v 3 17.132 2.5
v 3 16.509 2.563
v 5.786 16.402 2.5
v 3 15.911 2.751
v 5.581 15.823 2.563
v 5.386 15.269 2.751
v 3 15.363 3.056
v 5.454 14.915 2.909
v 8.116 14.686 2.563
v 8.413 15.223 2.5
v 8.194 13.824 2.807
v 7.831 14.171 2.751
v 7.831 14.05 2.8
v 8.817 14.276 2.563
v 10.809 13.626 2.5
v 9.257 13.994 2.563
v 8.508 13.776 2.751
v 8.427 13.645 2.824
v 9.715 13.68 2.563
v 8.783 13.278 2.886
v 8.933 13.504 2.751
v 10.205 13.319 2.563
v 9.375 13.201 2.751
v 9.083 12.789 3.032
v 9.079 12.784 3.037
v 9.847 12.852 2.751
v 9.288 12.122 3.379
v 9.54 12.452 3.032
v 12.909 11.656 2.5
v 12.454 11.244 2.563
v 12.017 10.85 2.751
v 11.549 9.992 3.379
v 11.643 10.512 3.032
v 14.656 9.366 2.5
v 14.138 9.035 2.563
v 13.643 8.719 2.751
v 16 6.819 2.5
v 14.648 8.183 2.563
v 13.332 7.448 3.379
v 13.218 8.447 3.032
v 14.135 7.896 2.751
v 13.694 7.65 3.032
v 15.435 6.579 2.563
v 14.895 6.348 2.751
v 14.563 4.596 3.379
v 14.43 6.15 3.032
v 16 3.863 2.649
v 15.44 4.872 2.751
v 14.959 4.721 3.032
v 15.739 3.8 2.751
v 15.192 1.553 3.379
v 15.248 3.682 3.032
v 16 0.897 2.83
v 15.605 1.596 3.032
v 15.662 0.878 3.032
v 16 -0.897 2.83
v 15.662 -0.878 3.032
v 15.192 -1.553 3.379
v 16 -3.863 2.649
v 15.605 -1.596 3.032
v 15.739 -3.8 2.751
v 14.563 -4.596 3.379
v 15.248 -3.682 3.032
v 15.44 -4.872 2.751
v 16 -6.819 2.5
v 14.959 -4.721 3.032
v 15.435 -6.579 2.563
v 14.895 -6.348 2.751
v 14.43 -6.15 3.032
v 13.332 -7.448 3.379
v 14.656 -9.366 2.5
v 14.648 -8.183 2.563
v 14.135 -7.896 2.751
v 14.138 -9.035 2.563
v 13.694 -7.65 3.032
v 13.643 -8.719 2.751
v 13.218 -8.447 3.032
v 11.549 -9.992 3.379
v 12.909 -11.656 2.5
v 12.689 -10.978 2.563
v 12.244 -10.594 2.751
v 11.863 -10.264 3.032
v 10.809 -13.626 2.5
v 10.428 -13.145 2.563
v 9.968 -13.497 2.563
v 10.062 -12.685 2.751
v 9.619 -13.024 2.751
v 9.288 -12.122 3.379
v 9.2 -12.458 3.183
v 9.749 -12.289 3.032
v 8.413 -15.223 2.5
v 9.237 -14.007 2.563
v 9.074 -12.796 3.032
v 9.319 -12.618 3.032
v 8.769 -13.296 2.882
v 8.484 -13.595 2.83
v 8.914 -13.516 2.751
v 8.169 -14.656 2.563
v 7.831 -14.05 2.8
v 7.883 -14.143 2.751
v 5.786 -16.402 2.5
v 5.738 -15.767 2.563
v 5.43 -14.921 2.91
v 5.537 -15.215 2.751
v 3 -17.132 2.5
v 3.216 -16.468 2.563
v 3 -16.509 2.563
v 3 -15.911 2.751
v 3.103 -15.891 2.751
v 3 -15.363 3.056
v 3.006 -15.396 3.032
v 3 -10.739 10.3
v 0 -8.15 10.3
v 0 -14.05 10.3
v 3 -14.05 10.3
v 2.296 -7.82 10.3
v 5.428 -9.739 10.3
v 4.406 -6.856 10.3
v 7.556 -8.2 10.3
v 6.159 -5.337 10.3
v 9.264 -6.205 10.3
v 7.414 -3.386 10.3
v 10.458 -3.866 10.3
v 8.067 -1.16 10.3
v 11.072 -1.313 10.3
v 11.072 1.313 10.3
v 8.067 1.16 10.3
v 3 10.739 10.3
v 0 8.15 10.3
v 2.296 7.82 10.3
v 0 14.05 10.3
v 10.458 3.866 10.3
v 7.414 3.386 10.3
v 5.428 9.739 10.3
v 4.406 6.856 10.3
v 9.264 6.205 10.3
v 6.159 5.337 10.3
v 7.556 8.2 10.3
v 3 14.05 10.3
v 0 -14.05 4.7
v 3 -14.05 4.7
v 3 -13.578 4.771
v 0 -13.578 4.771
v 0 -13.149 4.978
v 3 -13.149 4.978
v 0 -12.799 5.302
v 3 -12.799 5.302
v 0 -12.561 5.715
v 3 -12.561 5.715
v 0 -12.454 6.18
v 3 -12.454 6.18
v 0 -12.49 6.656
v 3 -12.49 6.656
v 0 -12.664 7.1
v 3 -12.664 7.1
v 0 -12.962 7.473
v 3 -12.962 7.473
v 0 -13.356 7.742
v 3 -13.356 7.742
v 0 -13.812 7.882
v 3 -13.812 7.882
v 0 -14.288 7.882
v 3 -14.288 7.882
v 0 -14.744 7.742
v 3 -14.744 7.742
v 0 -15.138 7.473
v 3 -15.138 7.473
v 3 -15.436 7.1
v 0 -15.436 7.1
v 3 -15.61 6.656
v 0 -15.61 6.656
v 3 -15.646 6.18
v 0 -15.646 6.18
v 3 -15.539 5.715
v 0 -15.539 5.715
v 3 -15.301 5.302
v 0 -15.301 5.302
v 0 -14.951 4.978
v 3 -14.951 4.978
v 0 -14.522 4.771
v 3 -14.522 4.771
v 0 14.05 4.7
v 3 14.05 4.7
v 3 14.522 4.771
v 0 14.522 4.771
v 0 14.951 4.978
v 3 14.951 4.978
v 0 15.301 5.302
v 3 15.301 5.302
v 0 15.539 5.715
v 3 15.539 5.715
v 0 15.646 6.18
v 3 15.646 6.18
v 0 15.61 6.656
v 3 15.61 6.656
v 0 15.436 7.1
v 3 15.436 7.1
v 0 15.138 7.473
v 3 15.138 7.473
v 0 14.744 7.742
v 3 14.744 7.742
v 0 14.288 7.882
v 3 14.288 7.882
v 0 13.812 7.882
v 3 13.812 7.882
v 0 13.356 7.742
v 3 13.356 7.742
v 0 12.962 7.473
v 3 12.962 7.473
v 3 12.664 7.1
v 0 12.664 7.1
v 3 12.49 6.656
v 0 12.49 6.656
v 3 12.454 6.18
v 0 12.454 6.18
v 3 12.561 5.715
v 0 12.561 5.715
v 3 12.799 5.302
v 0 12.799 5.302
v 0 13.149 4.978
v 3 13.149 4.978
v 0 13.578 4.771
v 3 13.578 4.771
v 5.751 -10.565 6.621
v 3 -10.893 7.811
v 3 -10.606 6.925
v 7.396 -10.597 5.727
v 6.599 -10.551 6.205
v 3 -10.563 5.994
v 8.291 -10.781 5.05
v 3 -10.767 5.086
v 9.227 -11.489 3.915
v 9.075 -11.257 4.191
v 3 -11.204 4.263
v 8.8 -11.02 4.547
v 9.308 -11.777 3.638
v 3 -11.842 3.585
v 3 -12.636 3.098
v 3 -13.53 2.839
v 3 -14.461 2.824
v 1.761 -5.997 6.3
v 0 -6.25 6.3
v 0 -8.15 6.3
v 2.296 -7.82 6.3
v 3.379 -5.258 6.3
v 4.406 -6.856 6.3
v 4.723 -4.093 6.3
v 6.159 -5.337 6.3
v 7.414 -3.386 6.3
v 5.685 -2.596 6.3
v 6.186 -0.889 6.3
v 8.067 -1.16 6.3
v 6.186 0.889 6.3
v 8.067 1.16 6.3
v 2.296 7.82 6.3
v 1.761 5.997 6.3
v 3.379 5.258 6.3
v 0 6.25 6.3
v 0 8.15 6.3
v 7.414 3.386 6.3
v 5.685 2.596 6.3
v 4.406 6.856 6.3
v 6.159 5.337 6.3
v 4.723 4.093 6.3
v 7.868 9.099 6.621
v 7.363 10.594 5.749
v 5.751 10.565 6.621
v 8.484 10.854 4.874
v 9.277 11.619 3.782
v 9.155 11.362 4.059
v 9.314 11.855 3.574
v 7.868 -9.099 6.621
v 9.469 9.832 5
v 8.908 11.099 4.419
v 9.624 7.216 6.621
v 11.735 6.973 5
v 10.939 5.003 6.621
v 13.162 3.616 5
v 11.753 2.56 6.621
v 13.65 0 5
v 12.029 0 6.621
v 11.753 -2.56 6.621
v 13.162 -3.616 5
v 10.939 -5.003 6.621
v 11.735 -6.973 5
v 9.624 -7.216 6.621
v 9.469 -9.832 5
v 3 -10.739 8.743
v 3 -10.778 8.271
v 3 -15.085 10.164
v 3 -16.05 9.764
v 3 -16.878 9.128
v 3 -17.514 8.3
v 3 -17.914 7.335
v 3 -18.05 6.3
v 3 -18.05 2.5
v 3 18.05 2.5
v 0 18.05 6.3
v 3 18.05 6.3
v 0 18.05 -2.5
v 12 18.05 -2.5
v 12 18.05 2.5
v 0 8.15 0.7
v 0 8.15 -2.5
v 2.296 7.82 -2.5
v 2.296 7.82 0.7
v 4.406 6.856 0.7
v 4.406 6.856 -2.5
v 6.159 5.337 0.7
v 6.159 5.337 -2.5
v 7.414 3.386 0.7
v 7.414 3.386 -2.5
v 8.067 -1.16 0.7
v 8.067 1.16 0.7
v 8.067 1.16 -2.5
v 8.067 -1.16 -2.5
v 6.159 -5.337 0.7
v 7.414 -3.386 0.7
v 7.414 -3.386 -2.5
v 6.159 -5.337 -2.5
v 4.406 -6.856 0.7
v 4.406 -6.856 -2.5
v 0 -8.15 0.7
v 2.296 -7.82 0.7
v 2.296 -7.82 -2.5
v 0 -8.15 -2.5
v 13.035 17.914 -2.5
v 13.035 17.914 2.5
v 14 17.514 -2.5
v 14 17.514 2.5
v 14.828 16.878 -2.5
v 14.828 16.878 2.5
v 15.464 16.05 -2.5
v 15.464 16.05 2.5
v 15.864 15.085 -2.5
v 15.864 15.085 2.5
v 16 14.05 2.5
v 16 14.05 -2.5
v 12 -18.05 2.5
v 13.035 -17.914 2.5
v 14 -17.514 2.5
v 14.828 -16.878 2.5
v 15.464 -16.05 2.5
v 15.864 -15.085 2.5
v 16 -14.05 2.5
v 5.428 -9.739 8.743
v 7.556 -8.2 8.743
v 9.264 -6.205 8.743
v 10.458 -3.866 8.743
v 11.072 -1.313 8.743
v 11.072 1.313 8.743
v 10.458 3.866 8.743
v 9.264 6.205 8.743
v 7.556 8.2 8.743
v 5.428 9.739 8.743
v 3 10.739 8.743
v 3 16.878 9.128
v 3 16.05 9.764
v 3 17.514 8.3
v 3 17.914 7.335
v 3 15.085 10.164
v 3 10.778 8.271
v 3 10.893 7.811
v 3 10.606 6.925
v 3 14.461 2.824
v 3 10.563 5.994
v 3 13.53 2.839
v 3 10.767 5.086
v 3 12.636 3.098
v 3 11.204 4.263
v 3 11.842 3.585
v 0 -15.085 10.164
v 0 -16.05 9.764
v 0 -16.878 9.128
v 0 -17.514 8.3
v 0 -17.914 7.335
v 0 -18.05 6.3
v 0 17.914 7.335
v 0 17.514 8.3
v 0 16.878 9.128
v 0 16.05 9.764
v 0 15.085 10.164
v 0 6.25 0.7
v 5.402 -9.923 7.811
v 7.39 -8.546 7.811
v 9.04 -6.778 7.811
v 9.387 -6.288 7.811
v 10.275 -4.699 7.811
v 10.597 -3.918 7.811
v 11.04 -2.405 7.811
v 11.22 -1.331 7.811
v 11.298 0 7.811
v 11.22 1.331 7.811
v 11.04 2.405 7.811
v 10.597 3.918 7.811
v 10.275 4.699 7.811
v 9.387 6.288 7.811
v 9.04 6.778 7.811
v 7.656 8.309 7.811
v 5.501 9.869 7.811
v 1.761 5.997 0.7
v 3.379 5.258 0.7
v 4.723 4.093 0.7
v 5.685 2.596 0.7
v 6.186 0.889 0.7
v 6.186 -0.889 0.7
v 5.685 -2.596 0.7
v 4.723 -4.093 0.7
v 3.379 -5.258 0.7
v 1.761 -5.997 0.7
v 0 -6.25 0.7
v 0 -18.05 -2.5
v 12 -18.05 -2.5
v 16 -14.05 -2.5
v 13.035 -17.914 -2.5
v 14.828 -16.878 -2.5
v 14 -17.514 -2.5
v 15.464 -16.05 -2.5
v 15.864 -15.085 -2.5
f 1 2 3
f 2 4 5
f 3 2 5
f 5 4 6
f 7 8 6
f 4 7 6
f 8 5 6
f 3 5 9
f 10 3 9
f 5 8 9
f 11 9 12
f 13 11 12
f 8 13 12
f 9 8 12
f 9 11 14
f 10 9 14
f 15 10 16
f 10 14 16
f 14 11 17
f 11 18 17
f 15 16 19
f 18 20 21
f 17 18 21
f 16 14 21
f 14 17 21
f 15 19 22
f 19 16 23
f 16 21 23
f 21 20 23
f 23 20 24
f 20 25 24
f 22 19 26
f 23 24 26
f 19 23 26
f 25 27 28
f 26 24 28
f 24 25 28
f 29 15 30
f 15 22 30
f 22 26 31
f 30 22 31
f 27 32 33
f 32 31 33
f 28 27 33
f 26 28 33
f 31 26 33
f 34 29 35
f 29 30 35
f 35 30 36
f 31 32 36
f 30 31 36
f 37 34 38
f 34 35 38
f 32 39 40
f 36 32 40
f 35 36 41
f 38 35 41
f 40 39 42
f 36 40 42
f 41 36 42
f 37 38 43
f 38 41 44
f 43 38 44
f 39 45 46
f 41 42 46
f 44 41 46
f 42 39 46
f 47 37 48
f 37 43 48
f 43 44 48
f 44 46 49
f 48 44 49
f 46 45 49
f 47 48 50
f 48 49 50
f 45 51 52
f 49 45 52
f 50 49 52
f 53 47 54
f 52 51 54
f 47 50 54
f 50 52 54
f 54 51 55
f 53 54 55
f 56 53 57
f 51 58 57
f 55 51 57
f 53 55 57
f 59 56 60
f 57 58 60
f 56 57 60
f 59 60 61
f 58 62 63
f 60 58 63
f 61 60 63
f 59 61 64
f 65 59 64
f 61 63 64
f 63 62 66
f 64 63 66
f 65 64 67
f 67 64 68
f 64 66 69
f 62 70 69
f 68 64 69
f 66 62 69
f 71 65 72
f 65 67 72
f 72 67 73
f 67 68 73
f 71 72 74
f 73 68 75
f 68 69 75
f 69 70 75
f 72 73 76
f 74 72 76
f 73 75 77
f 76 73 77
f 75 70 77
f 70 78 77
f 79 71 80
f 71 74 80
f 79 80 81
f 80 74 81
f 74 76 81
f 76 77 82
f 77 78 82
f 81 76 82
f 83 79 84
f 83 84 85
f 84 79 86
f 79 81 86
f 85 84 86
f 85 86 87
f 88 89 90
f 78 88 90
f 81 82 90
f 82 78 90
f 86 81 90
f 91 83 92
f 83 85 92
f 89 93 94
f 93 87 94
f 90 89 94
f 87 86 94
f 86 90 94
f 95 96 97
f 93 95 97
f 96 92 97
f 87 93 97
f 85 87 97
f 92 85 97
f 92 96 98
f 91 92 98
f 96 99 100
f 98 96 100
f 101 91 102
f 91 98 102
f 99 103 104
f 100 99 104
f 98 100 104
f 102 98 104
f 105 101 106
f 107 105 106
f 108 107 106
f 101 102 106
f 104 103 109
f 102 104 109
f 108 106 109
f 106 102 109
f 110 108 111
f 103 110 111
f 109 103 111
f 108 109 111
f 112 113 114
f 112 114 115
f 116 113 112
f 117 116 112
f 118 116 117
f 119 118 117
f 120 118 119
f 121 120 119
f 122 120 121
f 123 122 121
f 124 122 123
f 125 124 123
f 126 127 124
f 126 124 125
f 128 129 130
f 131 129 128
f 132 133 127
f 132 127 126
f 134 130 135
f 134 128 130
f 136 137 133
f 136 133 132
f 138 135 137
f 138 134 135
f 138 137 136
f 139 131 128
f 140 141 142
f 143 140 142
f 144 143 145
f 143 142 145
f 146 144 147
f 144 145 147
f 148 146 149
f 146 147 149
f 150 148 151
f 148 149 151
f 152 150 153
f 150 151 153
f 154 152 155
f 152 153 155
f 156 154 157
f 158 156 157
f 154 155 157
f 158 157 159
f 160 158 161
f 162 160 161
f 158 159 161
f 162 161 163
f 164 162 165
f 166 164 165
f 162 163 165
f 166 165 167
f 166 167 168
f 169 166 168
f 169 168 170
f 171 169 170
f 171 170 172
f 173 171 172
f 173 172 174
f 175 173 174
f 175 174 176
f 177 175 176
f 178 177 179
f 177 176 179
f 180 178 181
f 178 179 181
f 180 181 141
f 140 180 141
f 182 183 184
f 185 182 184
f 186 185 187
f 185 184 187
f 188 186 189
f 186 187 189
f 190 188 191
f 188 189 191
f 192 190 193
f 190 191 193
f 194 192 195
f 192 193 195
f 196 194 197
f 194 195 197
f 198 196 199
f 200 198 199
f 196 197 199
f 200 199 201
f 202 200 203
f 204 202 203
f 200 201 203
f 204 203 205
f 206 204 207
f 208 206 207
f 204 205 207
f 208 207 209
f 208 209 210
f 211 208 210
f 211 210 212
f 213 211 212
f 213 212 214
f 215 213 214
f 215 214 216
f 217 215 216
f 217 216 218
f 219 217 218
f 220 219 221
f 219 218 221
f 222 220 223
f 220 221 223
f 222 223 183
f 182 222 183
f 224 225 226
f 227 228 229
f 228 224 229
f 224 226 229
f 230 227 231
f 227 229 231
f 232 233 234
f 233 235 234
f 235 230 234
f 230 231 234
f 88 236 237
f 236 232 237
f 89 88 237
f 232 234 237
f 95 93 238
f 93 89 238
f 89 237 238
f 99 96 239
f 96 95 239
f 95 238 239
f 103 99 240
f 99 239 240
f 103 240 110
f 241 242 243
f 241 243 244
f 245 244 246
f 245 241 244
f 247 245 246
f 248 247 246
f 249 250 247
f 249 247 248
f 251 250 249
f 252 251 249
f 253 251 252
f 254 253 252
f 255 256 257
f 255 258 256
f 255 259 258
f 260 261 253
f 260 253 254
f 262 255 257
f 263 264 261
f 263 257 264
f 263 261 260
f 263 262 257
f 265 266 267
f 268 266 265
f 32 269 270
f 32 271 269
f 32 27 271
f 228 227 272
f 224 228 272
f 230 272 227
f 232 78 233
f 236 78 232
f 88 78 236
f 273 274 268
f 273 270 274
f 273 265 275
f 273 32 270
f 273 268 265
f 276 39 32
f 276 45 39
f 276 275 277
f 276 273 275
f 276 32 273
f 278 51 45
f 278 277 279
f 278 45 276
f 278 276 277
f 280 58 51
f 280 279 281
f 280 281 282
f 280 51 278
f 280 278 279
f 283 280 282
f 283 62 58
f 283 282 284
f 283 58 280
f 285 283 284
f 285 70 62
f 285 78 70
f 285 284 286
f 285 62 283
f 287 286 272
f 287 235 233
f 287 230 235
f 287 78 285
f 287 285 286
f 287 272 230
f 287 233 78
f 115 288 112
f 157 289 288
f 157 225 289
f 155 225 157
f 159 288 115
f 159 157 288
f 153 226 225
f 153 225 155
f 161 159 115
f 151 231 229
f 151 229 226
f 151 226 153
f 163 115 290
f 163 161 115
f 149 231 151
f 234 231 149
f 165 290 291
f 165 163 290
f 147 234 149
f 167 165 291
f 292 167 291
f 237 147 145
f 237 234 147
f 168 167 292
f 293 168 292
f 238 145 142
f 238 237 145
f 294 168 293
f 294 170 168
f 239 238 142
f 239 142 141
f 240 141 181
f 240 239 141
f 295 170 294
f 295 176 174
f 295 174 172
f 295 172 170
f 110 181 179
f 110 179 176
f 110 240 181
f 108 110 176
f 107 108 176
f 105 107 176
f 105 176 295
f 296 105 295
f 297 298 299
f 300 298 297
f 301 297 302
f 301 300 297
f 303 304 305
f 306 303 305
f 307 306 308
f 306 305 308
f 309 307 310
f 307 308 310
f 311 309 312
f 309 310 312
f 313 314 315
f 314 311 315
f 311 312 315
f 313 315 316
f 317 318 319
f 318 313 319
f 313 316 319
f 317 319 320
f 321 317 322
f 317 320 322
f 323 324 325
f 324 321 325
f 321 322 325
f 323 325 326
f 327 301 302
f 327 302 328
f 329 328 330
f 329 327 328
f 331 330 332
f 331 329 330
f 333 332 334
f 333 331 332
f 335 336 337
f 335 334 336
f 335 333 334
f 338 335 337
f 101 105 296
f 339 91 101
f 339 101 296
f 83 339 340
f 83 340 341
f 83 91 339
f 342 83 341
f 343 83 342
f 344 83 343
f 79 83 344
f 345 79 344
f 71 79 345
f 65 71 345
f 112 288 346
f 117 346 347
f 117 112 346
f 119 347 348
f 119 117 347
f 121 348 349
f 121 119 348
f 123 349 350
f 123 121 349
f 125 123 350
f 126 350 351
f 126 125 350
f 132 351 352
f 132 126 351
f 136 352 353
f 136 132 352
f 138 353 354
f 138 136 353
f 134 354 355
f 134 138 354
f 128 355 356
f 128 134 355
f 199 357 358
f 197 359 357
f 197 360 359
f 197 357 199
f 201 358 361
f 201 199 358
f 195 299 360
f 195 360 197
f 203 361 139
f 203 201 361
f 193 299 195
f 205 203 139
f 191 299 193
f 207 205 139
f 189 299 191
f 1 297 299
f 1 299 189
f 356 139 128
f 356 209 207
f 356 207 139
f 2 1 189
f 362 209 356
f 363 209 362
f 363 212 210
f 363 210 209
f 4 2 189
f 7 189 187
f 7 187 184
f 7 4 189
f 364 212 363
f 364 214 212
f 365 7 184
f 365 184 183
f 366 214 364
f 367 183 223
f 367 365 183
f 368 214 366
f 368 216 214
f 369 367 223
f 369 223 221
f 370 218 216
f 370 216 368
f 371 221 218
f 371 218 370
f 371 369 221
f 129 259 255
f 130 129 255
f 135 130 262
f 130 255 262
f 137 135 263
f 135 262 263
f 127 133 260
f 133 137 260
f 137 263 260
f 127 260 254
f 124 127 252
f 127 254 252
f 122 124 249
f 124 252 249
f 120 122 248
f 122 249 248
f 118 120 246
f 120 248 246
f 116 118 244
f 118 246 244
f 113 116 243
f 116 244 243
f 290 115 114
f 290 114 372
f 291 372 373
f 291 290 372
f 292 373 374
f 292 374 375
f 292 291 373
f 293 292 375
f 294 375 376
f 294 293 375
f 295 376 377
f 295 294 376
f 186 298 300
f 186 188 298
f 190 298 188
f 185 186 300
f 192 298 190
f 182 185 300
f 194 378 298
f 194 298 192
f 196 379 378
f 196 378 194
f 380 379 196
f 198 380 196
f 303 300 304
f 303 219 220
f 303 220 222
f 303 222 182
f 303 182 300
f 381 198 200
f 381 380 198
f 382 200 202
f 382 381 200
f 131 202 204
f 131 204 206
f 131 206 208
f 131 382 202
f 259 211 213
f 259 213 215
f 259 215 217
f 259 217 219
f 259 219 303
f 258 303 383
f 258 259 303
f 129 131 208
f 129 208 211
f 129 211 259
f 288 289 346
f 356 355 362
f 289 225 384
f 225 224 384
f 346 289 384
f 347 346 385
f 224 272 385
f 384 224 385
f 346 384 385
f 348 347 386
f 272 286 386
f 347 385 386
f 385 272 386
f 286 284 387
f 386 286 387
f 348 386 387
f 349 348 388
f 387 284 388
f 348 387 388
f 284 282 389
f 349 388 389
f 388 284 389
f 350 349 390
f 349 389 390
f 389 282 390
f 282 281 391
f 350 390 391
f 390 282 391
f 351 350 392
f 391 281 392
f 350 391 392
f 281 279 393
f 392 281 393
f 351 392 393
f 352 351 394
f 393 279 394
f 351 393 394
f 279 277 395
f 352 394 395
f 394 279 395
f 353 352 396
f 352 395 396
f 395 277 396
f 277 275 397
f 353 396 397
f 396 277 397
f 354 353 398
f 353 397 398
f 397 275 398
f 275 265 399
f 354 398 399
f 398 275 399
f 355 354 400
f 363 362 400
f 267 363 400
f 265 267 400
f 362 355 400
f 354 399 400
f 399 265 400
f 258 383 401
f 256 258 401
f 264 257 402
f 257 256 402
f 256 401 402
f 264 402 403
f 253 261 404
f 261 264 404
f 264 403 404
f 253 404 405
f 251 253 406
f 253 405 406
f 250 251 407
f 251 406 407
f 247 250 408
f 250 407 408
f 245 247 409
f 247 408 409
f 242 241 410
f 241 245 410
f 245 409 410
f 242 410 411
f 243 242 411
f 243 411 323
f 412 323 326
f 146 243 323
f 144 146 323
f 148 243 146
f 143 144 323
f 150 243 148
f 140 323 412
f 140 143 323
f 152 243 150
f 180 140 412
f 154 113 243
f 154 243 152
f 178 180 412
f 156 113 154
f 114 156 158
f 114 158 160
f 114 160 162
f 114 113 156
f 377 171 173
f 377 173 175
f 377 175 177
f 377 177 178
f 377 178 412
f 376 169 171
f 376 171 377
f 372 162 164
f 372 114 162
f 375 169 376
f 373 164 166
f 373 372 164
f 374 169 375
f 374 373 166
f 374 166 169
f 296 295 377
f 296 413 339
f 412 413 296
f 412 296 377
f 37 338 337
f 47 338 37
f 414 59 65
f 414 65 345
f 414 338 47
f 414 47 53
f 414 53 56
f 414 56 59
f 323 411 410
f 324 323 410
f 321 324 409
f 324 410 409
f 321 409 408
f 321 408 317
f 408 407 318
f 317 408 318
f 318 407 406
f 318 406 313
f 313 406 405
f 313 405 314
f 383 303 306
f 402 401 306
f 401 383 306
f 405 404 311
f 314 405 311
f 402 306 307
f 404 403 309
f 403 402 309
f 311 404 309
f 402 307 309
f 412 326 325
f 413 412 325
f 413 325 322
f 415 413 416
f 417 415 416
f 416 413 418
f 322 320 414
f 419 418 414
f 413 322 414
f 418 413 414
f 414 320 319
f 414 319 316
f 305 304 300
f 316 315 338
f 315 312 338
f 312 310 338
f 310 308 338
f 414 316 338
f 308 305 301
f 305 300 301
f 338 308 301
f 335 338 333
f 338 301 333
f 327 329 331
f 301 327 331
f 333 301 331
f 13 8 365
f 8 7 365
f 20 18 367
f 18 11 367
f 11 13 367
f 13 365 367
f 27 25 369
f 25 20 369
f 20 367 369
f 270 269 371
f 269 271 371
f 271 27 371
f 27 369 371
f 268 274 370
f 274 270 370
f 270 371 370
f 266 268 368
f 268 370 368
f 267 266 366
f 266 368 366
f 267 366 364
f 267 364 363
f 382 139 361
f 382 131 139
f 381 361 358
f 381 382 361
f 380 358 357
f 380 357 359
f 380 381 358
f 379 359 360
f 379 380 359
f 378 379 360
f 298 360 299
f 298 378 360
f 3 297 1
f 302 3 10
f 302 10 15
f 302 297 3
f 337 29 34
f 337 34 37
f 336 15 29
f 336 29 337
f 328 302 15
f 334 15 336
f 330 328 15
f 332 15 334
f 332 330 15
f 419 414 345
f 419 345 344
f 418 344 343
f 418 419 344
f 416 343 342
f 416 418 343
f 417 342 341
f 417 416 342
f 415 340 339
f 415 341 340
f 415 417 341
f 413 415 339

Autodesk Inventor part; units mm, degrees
ref_plane "YZ Plane" through (0, 0, 0) normal (1, 0, 0) x (0, 1, 0)
ref_plane "XZ Plane" through (0, 0, 0) normal (0, 1, 0) x (-1, 0, 0)
ref_plane "XY Plane" through (0, 0, 0) normal (0, 0, 1) x (1, 0, 0)
sketch "Sketch1" plane through (0, 0, 0) normal (0, 0, 1) x (1, 0, 0)
  line L0 (0, 18.05) -> (16, 18.05)
  line L1 (16, 18.05) -> (16, -18.05)
  line L2 (16, -18.05) -> (0, -18.05)
  arc A0 (0, -8.15) -> (0, 8.15) centre (0, 0) ccw
  line L3 (0, -18.05) -> (0, -8.15)
  line L4 (0, 8.15) -> (0, 18.05)
  point P0 (16, 0)
  dimension "d0" = 16.3
  dimension "d1" = 36.1
  dimension "d3" = 16
extrude "Extrusion1" add sketch "Sketch1" along normal mid plane 5
sketch "Sketch2" plane through (0, 0, 2.5) normal (0, 0, 1) x (1, 0, 0)
  arc A0 (0, -6.25) -> (0, 6.25) centre (0, 0) ccw
  arc A1 (0, -8.15) -> (0, 8.15) centre (0, 0) ccw
  line L0 (0, 6.25) -> (0, 8.15)
  line L1 (0, -6.25) -> (0, -8.15)
  dimension "d6" = 12.5
extrude "Extrusion2" add sketch "Sketch2" along normal blind 3.8 and the other way blind 1.8
sketch "Sketch3" plane through (0, 0, 6.3) normal (0, 0, 1) x (1, 0, 0)
  arc A0 (0, -8.15) -> (0, 8.15) centre (0, 0) ccw projected
  arc A1 (0, -11.15) -> (0, 11.15) centre (0, 0) ccw
  line L0 (0, -8.15) -> (0, -11.15)
  line L1 (0, 8.15) -> (0, 11.15)
  dimension "d11" = 3
extrude "Extrusion3" add sketch "Sketch3" along normal blind 4
sketch "Sketch4" plane through (0, 0, 6.3) normal (0, 0, -1) x (-1, 0, 0)
  arc A0 (0, 8.15) -> (0, -8.15) centre (0, 0) ccw projected
  line L0 (0, 11.15) -> (0, 8.15) projected
  arc A1 (0, 11.15) -> (0, -11.15) centre (0, 0) ccw projected
  line L1 (0, -8.15) -> (0, -11.15) projected
extrude "Extrusion4" add sketch "Sketch4" along normal up to surface (3.8 mm away)
sketch "Sketch5" plane through (0, 0, 2.5) normal (0, 0, 1) x (1, 0, 0)
  arc A0 (0, -11.15) -> (0, 11.15) centre (0, 0) ccw projected
  line L0 (16, 18.05) -> (0, 18.05) projected
  line L1 (3, 18.05) -> (3, 10.7388)
  arc A1 (0, -11.15) -> (0, 11.15) centre (0, 0) ccw projected
  line L2 (3, -10.7388) -> (3, -18.05)
  line L3 (0, -18.05) -> (16, -18.05) projected
  line L4 (0, 18.05) -> (0, 11.15) projected
  line L5 (0, -11.15) -> (0, -18.05) projected
  dimension "d16" = 3
extrude "Extrusion5" add sketch "Sketch5" along normal up to surface (7.8 mm away)
chamfer "Chamfer1" distance 5 angle 45 1 edges at (11.15, 0, 2.5)
fillet "Fillet1" radius 3 3 edges at (11.7041, -11.1281, 2.5) (11.15, 0, 7.5) (11.7041, 11.1281, 2.5)
sketch "Sketch6" plane through (3, -18.05, 2.5) normal (1, 0, 0) x (0, 0, -1)
  circle A0 centre (-3.8, 32.1) radius 1.6
  circle A1 centre (-3.8, 4) radius 1.6
  line L0 (0, 0) -> (-7.8, 0) projected
  line L1 (-7.8, 7.3112) -> (-7.8, 0) projected
  line L2 (0, 36.1) -> (-7.8, 36.1) projected
  point P0 (2.5, 18.05)
  dimension "d19" = 3.2
  dimension "d20" = 4
  dimension "d21" = 4
  dimension "d22" = 4
extrude "Extrusion6" cut sketch "Sketch6" against normal up to next
fillet "Fillet2" radius 4 2 edges at (1.5, -18.05, 10.3) (1.5, 18.05, 10.3)
fillet "Fillet3" radius 4 2 edges at (16, -18.05, 0) (16, 18.05, 0)
sketch "Sketch7" plane through (3, -18.05, 2.5) normal (1, 0, 0) x (0, 0, -1)
  arc A0 (-3.2482, 5.5018) -> (-2.2844, 4.5129) centre (-3.8, 4) ccw projected
  arc A1 (-2.2844, 31.5871) -> (-3.2482, 30.5982) centre (-3.8, 32.1) ccw projected
  circle A2 centre (-3.8, 4) radius 3.5
  circle A3 centre (-3.8, 32.1) radius 3.5
  point P0 (2.5, 18.05)
  dimension "d31" = 7
extrude "Extrusion7" cut sketch "Sketch7" along normal through all
properties part number "x-carriage-holder"
